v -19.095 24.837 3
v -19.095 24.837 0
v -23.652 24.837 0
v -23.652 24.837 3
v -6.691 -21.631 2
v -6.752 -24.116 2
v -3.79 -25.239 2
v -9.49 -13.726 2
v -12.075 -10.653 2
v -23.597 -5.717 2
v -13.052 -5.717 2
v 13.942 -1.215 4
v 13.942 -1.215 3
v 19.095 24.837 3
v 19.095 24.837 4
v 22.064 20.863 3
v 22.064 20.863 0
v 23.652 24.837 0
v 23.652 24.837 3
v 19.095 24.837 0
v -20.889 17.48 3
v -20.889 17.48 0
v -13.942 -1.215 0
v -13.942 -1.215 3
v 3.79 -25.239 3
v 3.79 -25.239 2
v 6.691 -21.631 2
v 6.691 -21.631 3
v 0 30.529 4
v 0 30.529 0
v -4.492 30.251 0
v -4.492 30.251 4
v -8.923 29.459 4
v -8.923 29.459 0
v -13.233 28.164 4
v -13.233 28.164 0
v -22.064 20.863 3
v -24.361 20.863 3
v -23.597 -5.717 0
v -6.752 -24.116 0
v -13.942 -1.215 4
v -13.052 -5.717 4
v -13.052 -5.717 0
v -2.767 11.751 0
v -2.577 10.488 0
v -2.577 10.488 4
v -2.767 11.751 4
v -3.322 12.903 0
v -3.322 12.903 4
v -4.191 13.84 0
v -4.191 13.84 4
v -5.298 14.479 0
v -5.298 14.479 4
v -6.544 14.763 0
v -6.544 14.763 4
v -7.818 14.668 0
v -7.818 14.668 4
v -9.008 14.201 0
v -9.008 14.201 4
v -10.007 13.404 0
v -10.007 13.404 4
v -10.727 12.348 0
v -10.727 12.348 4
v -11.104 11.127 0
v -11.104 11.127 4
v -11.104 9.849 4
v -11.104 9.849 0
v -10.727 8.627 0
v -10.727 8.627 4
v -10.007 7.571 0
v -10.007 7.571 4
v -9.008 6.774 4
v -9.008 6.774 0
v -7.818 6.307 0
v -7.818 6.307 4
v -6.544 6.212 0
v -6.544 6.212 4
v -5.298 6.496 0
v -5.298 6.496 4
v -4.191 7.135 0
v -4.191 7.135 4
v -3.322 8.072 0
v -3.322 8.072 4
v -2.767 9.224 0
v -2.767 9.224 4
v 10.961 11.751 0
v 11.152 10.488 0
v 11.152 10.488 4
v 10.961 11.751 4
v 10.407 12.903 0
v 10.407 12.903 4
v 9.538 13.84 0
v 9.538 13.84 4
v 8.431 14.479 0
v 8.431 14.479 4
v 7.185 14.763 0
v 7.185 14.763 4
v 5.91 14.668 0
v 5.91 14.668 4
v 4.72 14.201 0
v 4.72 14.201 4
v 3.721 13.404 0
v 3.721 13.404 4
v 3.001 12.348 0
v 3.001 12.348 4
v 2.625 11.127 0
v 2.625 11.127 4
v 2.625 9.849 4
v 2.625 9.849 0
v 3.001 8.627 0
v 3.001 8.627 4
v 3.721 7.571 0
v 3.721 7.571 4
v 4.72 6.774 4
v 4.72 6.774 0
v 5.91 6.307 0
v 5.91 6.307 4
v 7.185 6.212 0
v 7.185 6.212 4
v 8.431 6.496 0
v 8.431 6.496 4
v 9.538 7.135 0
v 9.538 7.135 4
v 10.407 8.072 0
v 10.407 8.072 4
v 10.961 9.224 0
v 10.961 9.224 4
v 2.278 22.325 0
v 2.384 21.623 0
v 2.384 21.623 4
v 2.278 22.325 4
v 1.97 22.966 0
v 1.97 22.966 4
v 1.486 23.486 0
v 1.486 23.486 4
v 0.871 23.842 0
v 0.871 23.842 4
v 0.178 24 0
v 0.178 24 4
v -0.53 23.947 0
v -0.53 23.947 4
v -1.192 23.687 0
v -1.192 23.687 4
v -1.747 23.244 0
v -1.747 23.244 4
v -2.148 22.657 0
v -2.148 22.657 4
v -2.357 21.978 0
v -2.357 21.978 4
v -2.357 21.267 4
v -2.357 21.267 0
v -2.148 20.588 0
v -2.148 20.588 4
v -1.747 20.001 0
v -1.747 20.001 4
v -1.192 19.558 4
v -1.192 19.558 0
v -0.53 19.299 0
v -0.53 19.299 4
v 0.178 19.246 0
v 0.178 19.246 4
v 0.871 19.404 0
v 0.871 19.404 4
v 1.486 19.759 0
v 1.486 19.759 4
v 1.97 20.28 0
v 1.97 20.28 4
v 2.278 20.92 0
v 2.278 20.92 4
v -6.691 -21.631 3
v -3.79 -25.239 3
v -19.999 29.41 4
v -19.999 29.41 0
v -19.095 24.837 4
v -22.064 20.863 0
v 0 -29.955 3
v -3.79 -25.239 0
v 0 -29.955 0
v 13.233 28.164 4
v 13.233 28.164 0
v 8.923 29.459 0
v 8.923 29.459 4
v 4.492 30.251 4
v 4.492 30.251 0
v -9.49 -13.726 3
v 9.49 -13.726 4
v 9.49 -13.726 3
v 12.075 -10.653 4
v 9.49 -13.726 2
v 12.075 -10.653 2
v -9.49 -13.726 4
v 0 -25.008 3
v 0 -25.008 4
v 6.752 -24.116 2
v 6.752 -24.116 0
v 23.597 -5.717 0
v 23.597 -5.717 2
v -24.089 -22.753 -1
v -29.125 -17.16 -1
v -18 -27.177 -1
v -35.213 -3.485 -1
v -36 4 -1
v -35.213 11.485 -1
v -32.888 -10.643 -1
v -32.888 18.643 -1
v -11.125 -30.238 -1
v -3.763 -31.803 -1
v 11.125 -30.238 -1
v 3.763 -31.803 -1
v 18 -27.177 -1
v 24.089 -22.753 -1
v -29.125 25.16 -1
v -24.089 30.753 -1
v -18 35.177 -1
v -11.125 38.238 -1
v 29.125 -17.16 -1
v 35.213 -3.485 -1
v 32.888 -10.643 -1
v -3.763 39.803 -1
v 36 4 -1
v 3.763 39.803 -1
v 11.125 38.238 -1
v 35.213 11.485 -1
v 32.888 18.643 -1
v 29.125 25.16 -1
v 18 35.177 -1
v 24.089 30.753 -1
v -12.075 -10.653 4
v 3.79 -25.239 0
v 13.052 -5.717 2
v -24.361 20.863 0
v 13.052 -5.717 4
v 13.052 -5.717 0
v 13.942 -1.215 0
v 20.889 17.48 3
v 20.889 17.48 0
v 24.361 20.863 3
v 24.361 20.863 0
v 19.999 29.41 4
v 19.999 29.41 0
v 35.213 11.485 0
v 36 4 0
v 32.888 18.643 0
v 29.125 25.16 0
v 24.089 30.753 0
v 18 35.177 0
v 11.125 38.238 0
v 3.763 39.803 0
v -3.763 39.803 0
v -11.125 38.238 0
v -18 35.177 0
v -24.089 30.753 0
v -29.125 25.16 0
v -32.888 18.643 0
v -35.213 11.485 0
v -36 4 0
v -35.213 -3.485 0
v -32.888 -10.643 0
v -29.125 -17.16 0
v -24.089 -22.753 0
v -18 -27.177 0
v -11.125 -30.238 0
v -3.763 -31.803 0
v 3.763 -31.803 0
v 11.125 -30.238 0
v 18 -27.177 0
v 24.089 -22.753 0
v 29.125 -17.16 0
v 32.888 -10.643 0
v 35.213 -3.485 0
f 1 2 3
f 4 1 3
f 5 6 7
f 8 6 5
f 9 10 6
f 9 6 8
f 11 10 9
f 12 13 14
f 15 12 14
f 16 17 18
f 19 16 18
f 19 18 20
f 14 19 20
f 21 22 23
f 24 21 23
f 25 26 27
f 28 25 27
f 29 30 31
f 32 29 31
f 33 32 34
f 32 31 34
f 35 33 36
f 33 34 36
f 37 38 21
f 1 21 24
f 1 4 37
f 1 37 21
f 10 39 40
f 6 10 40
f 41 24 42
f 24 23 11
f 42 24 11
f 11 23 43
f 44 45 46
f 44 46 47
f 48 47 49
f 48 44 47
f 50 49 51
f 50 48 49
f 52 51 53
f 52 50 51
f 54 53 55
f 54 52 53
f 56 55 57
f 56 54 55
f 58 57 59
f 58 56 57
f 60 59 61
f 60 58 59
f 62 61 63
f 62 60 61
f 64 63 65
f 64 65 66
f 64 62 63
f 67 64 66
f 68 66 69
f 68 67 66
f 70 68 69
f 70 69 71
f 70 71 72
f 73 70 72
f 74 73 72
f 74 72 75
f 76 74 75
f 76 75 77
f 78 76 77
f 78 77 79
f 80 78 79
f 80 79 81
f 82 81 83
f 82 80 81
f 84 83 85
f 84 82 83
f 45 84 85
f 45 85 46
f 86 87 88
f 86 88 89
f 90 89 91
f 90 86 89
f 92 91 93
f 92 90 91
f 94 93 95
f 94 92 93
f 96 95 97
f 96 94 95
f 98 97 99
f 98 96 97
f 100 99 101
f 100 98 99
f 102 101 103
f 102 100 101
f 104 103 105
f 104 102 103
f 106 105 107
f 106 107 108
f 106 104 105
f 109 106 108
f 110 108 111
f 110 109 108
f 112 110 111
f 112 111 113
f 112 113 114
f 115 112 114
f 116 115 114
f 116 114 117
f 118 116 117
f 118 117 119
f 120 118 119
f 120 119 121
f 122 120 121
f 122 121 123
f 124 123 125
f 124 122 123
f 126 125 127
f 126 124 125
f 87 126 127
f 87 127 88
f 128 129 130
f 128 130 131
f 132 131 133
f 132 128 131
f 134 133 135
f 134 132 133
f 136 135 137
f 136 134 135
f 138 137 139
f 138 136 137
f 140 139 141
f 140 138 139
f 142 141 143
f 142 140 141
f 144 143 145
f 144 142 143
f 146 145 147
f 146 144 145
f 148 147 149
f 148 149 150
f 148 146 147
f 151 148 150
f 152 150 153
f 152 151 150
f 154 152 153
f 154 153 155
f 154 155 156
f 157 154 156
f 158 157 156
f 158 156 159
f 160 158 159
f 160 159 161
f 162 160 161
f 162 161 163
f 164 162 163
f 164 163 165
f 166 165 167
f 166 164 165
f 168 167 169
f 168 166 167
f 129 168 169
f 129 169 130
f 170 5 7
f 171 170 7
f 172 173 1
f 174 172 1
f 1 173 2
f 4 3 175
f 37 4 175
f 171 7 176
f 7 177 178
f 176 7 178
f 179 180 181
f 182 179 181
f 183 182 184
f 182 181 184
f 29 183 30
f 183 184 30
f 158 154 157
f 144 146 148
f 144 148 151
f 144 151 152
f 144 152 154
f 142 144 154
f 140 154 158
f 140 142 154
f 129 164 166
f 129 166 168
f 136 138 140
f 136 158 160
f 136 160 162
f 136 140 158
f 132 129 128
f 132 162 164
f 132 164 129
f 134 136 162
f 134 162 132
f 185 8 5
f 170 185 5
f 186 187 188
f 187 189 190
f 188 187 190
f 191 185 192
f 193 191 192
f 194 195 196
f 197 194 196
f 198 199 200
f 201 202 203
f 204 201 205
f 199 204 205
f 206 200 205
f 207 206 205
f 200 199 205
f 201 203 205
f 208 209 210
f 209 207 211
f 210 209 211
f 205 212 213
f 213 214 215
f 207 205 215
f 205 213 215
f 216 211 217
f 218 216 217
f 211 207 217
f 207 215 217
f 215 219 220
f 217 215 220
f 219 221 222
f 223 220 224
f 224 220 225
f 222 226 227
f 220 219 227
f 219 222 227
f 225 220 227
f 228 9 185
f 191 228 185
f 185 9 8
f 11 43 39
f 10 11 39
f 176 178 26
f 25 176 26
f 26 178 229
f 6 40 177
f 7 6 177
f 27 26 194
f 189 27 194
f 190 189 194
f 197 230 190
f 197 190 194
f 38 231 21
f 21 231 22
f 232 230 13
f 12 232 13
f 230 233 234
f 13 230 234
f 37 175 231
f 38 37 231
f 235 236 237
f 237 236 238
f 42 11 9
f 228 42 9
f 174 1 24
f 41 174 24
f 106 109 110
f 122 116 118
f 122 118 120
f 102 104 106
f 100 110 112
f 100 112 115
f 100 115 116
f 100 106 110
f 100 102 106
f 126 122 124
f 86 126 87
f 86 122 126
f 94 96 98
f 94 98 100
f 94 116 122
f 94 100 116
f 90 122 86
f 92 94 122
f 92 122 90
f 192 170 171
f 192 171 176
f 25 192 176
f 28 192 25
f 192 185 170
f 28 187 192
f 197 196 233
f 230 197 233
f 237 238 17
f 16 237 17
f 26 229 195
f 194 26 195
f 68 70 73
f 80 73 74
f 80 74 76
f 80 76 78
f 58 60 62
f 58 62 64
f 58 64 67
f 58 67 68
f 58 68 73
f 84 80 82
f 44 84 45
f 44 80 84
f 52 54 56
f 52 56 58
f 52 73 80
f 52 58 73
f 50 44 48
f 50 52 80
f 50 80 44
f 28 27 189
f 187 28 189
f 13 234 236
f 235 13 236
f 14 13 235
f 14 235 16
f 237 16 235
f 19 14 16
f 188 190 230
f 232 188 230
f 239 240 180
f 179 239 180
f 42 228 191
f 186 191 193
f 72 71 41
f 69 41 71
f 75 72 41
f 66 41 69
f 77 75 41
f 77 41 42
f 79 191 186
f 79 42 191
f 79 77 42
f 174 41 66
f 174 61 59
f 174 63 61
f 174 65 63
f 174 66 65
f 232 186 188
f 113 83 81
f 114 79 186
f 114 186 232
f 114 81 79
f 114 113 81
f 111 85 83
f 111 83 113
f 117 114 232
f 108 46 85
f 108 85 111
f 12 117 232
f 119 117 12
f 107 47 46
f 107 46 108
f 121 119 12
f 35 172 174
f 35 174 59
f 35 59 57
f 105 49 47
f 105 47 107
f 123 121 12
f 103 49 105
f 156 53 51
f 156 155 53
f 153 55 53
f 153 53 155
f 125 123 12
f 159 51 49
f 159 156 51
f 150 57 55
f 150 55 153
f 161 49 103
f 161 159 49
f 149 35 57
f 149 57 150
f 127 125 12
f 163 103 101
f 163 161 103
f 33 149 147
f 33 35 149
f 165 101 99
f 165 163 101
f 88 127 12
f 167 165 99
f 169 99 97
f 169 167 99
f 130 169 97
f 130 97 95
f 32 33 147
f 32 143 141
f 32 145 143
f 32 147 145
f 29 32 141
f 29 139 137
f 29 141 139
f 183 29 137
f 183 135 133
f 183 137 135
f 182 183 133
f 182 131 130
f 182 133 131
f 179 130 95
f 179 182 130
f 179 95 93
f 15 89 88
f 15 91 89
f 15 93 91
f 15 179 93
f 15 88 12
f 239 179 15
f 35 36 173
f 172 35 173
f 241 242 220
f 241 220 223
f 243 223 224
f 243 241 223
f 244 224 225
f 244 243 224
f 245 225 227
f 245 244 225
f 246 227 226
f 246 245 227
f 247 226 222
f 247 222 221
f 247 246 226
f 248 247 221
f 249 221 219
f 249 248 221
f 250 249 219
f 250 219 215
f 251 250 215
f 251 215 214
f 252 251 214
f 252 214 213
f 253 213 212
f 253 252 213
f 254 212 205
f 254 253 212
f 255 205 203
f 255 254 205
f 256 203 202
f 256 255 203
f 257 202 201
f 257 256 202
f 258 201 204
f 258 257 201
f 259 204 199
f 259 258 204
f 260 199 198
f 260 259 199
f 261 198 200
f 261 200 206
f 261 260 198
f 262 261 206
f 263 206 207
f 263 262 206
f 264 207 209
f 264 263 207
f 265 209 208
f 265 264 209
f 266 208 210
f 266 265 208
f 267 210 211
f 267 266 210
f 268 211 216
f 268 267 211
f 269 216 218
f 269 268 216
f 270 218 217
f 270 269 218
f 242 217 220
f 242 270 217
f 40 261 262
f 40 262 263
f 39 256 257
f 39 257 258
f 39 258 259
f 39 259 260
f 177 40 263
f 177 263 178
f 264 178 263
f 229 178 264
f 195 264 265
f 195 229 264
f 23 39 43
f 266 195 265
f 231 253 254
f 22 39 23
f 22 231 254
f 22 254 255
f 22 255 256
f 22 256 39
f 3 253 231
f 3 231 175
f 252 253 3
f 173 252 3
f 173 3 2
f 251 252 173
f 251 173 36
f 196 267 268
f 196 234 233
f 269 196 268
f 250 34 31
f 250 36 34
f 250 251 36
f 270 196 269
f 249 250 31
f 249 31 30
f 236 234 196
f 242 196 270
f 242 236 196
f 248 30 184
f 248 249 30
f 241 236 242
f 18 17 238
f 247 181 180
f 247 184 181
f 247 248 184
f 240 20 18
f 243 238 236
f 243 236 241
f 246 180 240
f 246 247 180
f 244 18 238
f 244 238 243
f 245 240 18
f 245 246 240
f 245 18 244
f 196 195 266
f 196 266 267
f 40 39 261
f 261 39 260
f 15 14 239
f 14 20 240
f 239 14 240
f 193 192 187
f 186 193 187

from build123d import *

# Parameters (mm, degrees)
F0_R     = 4.2876068596
F0_R_2   = 2.3838147506
F1_DEPTH = 4
F2_DEPTH = 2
F3_DEPTH = 3
F0_R_3   = 36
F4_DEPTH = 1


with BuildPart() as f1:
    # F0 (on Top) → F1 (new body)
    with BuildSketch(Plane.XY):
        with BuildLine():
            Line((-13.0515498851, -5.7173473364), (-12.0754661039, -10.6526017189))
            Line((-12.0754661039, -10.6526017189), (-9.4899676344, -13.7262029863))
            Line((-9.4899676344, -13.7262029863), (0, -25.0077322125))
            Line((0, -25.0077322125), (9.4899676344, -13.7262029863))
            Line((9.4899676344, -13.7262029863), (12.0754661039, -10.6526017189))
            Line((12.0754661039, -10.6526017189), (13.0515498851, -5.7173473364))
            Line((13.0515498851, -5.7173473364), (13.9420140412, -1.2150011097))
            Line((13.9420140412, -1.2150011097), (19.0945449157, 24.8371176422))
            Line((19.0945449157, 24.8371176422), (19.9989844114, 29.4101256877))
            Line((19.9989844114, 29.4101256877), (13.2328327745, 28.1637310982))
            ThreePointArc((13.2328327745, 28.1637310982), (6.7187616823, 29.9189517629), (0, 30.5290035903))
            ThreePointArc((0, 30.5290035903), (-6.7187616823, 29.9189517629), (-13.2328327745, 28.1637310982))
            Line((-13.2328327745, 28.1637310982), (-19.9989844114, 29.4101256877))
            Line((-19.9989844114, 29.4101256877), (-19.0945449157, 24.8371176422))
            Line((-19.0945449157, 24.8371176422), (-13.9420140412, -1.2150011097))
            Line((-13.9420140412, -1.2150011097), (-13.0515498851, -5.7173473364))
        make_face()
        with Locations((-6.8642999977, 10.4875685647)):
            Circle(F0_R, mode=Mode.SUBTRACT)
        with Locations((6.8642999977, 10.4875685647)):
            Circle(F0_R, mode=Mode.SUBTRACT)
        with Locations((0, 21.6226968914)):
            Circle(F0_R_2, mode=Mode.SUBTRACT)
    extrude(amount=F1_DEPTH)

    # F0 (on Top) → F2 (join)
    with BuildSketch(Plane.XY):
        Polygon((-9.4899676344, -13.7262029863), (-12.0754661039, -10.6526017189), (-13.0515498851, -5.7173473364), (-23.5967580229, -5.7173473364), (-6.7524560727, -24.1164751351), (-3.7902638408, -25.2393729972), (-6.6908341832, -21.6307397932), align=None)
        Polygon((12.0754661039, -10.6526017189), (9.4899676344, -13.7262029863), (6.6908341832, -21.6307397932), (3.7902638408, -25.2393729972), (6.7524560727, -24.1164751351), (23.5967580229, -5.7173473364), (13.0515498851, -5.7173473364), align=None)
    extrude(amount=F2_DEPTH)

    # F0 (on Top) → F3 (join)
    with BuildSketch(Plane.XY):
        Polygon((0, -25.0077322125), (-9.4899676344, -13.7262029863), (-6.6908341832, -21.6307397932), (-3.7902638408, -25.2393729972), (0, -29.9548842013), (3.7902638408, -25.2393729972), (6.6908341832, -21.6307397932), (9.4899676344, -13.7262029863), align=None)
        Polygon((-20.8892654628, 17.4803361297), (-13.9420140412, -1.2150011097), (-19.0945449157, 24.8371176422), (-23.6523598433, 24.8371176422), (-22.0642630011, 20.8634119481), (-24.3613701314, 20.8634119481), align=None)
        Polygon((19.0945449157, 24.8371176422), (13.9420140412, -1.2150011097), (20.8892654628, 17.4803361297), (24.3613701314, 20.8634119481), (22.0642630011, 20.8634119481), (23.6523598433, 24.8371176422), align=None)
    extrude(amount=F3_DEPTH)

    # F0 (on Top) → F4 (join)
    with BuildSketch(Plane.XY):
        with Locations((0, 4)):
            Circle(F0_R_3)
        with BuildLine():
            Line((-23.5967580229, -5.7173473364), (-13.0515498851, -5.7173473364))
            Line((-13.0515498851, -5.7173473364), (-13.9420140412, -1.2150011097))
            Line((-13.9420140412, -1.2150011097), (-20.8892654628, 17.4803361297))
            Line((-20.8892654628, 17.4803361297), (-24.3613701314, 20.8634119481))
            Line((-24.3613701314, 20.8634119481), (-22.0642630011, 20.8634119481))
            Line((-22.0642630011, 20.8634119481), (-23.6523598433, 24.8371176422))
            Line((-23.6523598433, 24.8371176422), (-19.0945449157, 24.8371176422))
            Line((-19.0945449157, 24.8371176422), (-19.9989844114, 29.4101256877))
            Line((-19.9989844114, 29.4101256877), (-13.2328327745, 28.1637310982))
            ThreePointArc((-13.2328327745, 28.1637310982), (-6.7187616823, 29.9189517629), (0, 30.5290035903))
            ThreePointArc((0, 30.5290035903), (6.7187616823, 29.9189517629), (13.2328327745, 28.1637310982))
            Line((13.2328327745, 28.1637310982), (19.9989844114, 29.4101256877))
            Line((19.9989844114, 29.4101256877), (19.0945449157, 24.8371176422))
            Line((19.0945449157, 24.8371176422), (23.6523598433, 24.8371176422))
            Line((23.6523598433, 24.8371176422), (22.0642630011, 20.8634119481))
            Line((22.0642630011, 20.8634119481), (24.3613701314, 20.8634119481))
            Line((24.3613701314, 20.8634119481), (20.8892654628, 17.4803361297))
            Line((20.8892654628, 17.4803361297), (13.9420140412, -1.2150011097))
            Line((13.9420140412, -1.2150011097), (13.0515498851, -5.7173473364))
            Line((13.0515498851, -5.7173473364), (23.5967580229, -5.7173473364))
            Line((23.5967580229, -5.7173473364), (6.7524560727, -24.1164751351))
            Line((6.7524560727, -24.1164751351), (3.7902638408, -25.2393729972))
            Line((3.7902638408, -25.2393729972), (0, -29.9548842013))
            Line((0, -29.9548842013), (-3.7902638408, -25.2393729972))
            Line((-3.7902638408, -25.2393729972), (-6.7524560727, -24.1164751351))
            Line((-6.7524560727, -24.1164751351), (-23.5967580229, -5.7173473364))
        make_face(mode=Mode.SUBTRACT)
        with BuildLine():
            Line((-13.0515498851, -5.7173473364), (-12.0754661039, -10.6526017189))
            Line((-12.0754661039, -10.6526017189), (-9.4899676344, -13.7262029863))
            Line((-9.4899676344, -13.7262029863), (0, -25.0077322125))
            Line((0, -25.0077322125), (9.4899676344, -13.7262029863))
            Line((9.4899676344, -13.7262029863), (12.0754661039, -10.6526017189))
            Line((12.0754661039, -10.6526017189), (13.0515498851, -5.7173473364))
            Line((13.0515498851, -5.7173473364), (13.9420140412, -1.2150011097))
            Line((13.9420140412, -1.2150011097), (19.0945449157, 24.8371176422))
            Line((19.0945449157, 24.8371176422), (19.9989844114, 29.4101256877))
            Line((19.9989844114, 29.4101256877), (13.2328327745, 28.1637310982))
            ThreePointArc((13.2328327745, 28.1637310982), (6.7187616823, 29.9189517629), (0, 30.5290035903))
            ThreePointArc((0, 30.5290035903), (-6.7187616823, 29.9189517629), (-13.2328327745, 28.1637310982))
            Line((-13.2328327745, 28.1637310982), (-19.9989844114, 29.4101256877))
            Line((-19.9989844114, 29.4101256877), (-19.0945449157, 24.8371176422))
            Line((-19.0945449157, 24.8371176422), (-13.9420140412, -1.2150011097))
            Line((-13.9420140412, -1.2150011097), (-13.0515498851, -5.7173473364))
        make_face()
        with Locations((-6.8642999977, 10.4875685647)):
            Circle(F0_R, mode=Mode.SUBTRACT)
        with Locations((6.8642999977, 10.4875685647)):
            Circle(F0_R, mode=Mode.SUBTRACT)
        with Locations((0, 21.6226968914)):
            Circle(F0_R_2, mode=Mode.SUBTRACT)
        Polygon((-9.4899676344, -13.7262029863), (-12.0754661039, -10.6526017189), (-13.0515498851, -5.7173473364), (-23.5967580229, -5.7173473364), (-6.7524560727, -24.1164751351), (-3.7902638408, -25.2393729972), (-6.6908341832, -21.6307397932), align=None)
        Polygon((12.0754661039, -10.6526017189), (9.4899676344, -13.7262029863), (6.6908341832, -21.6307397932), (3.7902638408, -25.2393729972), (6.7524560727, -24.1164751351), (23.5967580229, -5.7173473364), (13.0515498851, -5.7173473364), align=None)
        Polygon((0, -25.0077322125), (-9.4899676344, -13.7262029863), (-6.6908341832, -21.6307397932), (-3.7902638408, -25.2393729972), (0, -29.9548842013), (3.7902638408, -25.2393729972), (6.6908341832, -21.6307397932), (9.4899676344, -13.7262029863), align=None)
        Polygon((-20.8892654628, 17.4803361297), (-13.9420140412, -1.2150011097), (-19.0945449157, 24.8371176422), (-23.6523598433, 24.8371176422), (-22.0642630011, 20.8634119481), (-24.3613701314, 20.8634119481), align=None)
        Polygon((19.0945449157, 24.8371176422), (13.9420140412, -1.2150011097), (20.8892654628, 17.4803361297), (24.3613701314, 20.8634119481), (22.0642630011, 20.8634119481), (23.6523598433, 24.8371176422), align=None)
        with Locations((-6.8642999977, 10.4875685647)):
            Circle(F0_R)
        with Locations((6.8642999977, 10.4875685647)):
            Circle(F0_R)
        with Locations((0, 21.6226968914)):
            Circle(F0_R_2)
    extrude(amount=-F4_DEPTH)


solid = f1.part
